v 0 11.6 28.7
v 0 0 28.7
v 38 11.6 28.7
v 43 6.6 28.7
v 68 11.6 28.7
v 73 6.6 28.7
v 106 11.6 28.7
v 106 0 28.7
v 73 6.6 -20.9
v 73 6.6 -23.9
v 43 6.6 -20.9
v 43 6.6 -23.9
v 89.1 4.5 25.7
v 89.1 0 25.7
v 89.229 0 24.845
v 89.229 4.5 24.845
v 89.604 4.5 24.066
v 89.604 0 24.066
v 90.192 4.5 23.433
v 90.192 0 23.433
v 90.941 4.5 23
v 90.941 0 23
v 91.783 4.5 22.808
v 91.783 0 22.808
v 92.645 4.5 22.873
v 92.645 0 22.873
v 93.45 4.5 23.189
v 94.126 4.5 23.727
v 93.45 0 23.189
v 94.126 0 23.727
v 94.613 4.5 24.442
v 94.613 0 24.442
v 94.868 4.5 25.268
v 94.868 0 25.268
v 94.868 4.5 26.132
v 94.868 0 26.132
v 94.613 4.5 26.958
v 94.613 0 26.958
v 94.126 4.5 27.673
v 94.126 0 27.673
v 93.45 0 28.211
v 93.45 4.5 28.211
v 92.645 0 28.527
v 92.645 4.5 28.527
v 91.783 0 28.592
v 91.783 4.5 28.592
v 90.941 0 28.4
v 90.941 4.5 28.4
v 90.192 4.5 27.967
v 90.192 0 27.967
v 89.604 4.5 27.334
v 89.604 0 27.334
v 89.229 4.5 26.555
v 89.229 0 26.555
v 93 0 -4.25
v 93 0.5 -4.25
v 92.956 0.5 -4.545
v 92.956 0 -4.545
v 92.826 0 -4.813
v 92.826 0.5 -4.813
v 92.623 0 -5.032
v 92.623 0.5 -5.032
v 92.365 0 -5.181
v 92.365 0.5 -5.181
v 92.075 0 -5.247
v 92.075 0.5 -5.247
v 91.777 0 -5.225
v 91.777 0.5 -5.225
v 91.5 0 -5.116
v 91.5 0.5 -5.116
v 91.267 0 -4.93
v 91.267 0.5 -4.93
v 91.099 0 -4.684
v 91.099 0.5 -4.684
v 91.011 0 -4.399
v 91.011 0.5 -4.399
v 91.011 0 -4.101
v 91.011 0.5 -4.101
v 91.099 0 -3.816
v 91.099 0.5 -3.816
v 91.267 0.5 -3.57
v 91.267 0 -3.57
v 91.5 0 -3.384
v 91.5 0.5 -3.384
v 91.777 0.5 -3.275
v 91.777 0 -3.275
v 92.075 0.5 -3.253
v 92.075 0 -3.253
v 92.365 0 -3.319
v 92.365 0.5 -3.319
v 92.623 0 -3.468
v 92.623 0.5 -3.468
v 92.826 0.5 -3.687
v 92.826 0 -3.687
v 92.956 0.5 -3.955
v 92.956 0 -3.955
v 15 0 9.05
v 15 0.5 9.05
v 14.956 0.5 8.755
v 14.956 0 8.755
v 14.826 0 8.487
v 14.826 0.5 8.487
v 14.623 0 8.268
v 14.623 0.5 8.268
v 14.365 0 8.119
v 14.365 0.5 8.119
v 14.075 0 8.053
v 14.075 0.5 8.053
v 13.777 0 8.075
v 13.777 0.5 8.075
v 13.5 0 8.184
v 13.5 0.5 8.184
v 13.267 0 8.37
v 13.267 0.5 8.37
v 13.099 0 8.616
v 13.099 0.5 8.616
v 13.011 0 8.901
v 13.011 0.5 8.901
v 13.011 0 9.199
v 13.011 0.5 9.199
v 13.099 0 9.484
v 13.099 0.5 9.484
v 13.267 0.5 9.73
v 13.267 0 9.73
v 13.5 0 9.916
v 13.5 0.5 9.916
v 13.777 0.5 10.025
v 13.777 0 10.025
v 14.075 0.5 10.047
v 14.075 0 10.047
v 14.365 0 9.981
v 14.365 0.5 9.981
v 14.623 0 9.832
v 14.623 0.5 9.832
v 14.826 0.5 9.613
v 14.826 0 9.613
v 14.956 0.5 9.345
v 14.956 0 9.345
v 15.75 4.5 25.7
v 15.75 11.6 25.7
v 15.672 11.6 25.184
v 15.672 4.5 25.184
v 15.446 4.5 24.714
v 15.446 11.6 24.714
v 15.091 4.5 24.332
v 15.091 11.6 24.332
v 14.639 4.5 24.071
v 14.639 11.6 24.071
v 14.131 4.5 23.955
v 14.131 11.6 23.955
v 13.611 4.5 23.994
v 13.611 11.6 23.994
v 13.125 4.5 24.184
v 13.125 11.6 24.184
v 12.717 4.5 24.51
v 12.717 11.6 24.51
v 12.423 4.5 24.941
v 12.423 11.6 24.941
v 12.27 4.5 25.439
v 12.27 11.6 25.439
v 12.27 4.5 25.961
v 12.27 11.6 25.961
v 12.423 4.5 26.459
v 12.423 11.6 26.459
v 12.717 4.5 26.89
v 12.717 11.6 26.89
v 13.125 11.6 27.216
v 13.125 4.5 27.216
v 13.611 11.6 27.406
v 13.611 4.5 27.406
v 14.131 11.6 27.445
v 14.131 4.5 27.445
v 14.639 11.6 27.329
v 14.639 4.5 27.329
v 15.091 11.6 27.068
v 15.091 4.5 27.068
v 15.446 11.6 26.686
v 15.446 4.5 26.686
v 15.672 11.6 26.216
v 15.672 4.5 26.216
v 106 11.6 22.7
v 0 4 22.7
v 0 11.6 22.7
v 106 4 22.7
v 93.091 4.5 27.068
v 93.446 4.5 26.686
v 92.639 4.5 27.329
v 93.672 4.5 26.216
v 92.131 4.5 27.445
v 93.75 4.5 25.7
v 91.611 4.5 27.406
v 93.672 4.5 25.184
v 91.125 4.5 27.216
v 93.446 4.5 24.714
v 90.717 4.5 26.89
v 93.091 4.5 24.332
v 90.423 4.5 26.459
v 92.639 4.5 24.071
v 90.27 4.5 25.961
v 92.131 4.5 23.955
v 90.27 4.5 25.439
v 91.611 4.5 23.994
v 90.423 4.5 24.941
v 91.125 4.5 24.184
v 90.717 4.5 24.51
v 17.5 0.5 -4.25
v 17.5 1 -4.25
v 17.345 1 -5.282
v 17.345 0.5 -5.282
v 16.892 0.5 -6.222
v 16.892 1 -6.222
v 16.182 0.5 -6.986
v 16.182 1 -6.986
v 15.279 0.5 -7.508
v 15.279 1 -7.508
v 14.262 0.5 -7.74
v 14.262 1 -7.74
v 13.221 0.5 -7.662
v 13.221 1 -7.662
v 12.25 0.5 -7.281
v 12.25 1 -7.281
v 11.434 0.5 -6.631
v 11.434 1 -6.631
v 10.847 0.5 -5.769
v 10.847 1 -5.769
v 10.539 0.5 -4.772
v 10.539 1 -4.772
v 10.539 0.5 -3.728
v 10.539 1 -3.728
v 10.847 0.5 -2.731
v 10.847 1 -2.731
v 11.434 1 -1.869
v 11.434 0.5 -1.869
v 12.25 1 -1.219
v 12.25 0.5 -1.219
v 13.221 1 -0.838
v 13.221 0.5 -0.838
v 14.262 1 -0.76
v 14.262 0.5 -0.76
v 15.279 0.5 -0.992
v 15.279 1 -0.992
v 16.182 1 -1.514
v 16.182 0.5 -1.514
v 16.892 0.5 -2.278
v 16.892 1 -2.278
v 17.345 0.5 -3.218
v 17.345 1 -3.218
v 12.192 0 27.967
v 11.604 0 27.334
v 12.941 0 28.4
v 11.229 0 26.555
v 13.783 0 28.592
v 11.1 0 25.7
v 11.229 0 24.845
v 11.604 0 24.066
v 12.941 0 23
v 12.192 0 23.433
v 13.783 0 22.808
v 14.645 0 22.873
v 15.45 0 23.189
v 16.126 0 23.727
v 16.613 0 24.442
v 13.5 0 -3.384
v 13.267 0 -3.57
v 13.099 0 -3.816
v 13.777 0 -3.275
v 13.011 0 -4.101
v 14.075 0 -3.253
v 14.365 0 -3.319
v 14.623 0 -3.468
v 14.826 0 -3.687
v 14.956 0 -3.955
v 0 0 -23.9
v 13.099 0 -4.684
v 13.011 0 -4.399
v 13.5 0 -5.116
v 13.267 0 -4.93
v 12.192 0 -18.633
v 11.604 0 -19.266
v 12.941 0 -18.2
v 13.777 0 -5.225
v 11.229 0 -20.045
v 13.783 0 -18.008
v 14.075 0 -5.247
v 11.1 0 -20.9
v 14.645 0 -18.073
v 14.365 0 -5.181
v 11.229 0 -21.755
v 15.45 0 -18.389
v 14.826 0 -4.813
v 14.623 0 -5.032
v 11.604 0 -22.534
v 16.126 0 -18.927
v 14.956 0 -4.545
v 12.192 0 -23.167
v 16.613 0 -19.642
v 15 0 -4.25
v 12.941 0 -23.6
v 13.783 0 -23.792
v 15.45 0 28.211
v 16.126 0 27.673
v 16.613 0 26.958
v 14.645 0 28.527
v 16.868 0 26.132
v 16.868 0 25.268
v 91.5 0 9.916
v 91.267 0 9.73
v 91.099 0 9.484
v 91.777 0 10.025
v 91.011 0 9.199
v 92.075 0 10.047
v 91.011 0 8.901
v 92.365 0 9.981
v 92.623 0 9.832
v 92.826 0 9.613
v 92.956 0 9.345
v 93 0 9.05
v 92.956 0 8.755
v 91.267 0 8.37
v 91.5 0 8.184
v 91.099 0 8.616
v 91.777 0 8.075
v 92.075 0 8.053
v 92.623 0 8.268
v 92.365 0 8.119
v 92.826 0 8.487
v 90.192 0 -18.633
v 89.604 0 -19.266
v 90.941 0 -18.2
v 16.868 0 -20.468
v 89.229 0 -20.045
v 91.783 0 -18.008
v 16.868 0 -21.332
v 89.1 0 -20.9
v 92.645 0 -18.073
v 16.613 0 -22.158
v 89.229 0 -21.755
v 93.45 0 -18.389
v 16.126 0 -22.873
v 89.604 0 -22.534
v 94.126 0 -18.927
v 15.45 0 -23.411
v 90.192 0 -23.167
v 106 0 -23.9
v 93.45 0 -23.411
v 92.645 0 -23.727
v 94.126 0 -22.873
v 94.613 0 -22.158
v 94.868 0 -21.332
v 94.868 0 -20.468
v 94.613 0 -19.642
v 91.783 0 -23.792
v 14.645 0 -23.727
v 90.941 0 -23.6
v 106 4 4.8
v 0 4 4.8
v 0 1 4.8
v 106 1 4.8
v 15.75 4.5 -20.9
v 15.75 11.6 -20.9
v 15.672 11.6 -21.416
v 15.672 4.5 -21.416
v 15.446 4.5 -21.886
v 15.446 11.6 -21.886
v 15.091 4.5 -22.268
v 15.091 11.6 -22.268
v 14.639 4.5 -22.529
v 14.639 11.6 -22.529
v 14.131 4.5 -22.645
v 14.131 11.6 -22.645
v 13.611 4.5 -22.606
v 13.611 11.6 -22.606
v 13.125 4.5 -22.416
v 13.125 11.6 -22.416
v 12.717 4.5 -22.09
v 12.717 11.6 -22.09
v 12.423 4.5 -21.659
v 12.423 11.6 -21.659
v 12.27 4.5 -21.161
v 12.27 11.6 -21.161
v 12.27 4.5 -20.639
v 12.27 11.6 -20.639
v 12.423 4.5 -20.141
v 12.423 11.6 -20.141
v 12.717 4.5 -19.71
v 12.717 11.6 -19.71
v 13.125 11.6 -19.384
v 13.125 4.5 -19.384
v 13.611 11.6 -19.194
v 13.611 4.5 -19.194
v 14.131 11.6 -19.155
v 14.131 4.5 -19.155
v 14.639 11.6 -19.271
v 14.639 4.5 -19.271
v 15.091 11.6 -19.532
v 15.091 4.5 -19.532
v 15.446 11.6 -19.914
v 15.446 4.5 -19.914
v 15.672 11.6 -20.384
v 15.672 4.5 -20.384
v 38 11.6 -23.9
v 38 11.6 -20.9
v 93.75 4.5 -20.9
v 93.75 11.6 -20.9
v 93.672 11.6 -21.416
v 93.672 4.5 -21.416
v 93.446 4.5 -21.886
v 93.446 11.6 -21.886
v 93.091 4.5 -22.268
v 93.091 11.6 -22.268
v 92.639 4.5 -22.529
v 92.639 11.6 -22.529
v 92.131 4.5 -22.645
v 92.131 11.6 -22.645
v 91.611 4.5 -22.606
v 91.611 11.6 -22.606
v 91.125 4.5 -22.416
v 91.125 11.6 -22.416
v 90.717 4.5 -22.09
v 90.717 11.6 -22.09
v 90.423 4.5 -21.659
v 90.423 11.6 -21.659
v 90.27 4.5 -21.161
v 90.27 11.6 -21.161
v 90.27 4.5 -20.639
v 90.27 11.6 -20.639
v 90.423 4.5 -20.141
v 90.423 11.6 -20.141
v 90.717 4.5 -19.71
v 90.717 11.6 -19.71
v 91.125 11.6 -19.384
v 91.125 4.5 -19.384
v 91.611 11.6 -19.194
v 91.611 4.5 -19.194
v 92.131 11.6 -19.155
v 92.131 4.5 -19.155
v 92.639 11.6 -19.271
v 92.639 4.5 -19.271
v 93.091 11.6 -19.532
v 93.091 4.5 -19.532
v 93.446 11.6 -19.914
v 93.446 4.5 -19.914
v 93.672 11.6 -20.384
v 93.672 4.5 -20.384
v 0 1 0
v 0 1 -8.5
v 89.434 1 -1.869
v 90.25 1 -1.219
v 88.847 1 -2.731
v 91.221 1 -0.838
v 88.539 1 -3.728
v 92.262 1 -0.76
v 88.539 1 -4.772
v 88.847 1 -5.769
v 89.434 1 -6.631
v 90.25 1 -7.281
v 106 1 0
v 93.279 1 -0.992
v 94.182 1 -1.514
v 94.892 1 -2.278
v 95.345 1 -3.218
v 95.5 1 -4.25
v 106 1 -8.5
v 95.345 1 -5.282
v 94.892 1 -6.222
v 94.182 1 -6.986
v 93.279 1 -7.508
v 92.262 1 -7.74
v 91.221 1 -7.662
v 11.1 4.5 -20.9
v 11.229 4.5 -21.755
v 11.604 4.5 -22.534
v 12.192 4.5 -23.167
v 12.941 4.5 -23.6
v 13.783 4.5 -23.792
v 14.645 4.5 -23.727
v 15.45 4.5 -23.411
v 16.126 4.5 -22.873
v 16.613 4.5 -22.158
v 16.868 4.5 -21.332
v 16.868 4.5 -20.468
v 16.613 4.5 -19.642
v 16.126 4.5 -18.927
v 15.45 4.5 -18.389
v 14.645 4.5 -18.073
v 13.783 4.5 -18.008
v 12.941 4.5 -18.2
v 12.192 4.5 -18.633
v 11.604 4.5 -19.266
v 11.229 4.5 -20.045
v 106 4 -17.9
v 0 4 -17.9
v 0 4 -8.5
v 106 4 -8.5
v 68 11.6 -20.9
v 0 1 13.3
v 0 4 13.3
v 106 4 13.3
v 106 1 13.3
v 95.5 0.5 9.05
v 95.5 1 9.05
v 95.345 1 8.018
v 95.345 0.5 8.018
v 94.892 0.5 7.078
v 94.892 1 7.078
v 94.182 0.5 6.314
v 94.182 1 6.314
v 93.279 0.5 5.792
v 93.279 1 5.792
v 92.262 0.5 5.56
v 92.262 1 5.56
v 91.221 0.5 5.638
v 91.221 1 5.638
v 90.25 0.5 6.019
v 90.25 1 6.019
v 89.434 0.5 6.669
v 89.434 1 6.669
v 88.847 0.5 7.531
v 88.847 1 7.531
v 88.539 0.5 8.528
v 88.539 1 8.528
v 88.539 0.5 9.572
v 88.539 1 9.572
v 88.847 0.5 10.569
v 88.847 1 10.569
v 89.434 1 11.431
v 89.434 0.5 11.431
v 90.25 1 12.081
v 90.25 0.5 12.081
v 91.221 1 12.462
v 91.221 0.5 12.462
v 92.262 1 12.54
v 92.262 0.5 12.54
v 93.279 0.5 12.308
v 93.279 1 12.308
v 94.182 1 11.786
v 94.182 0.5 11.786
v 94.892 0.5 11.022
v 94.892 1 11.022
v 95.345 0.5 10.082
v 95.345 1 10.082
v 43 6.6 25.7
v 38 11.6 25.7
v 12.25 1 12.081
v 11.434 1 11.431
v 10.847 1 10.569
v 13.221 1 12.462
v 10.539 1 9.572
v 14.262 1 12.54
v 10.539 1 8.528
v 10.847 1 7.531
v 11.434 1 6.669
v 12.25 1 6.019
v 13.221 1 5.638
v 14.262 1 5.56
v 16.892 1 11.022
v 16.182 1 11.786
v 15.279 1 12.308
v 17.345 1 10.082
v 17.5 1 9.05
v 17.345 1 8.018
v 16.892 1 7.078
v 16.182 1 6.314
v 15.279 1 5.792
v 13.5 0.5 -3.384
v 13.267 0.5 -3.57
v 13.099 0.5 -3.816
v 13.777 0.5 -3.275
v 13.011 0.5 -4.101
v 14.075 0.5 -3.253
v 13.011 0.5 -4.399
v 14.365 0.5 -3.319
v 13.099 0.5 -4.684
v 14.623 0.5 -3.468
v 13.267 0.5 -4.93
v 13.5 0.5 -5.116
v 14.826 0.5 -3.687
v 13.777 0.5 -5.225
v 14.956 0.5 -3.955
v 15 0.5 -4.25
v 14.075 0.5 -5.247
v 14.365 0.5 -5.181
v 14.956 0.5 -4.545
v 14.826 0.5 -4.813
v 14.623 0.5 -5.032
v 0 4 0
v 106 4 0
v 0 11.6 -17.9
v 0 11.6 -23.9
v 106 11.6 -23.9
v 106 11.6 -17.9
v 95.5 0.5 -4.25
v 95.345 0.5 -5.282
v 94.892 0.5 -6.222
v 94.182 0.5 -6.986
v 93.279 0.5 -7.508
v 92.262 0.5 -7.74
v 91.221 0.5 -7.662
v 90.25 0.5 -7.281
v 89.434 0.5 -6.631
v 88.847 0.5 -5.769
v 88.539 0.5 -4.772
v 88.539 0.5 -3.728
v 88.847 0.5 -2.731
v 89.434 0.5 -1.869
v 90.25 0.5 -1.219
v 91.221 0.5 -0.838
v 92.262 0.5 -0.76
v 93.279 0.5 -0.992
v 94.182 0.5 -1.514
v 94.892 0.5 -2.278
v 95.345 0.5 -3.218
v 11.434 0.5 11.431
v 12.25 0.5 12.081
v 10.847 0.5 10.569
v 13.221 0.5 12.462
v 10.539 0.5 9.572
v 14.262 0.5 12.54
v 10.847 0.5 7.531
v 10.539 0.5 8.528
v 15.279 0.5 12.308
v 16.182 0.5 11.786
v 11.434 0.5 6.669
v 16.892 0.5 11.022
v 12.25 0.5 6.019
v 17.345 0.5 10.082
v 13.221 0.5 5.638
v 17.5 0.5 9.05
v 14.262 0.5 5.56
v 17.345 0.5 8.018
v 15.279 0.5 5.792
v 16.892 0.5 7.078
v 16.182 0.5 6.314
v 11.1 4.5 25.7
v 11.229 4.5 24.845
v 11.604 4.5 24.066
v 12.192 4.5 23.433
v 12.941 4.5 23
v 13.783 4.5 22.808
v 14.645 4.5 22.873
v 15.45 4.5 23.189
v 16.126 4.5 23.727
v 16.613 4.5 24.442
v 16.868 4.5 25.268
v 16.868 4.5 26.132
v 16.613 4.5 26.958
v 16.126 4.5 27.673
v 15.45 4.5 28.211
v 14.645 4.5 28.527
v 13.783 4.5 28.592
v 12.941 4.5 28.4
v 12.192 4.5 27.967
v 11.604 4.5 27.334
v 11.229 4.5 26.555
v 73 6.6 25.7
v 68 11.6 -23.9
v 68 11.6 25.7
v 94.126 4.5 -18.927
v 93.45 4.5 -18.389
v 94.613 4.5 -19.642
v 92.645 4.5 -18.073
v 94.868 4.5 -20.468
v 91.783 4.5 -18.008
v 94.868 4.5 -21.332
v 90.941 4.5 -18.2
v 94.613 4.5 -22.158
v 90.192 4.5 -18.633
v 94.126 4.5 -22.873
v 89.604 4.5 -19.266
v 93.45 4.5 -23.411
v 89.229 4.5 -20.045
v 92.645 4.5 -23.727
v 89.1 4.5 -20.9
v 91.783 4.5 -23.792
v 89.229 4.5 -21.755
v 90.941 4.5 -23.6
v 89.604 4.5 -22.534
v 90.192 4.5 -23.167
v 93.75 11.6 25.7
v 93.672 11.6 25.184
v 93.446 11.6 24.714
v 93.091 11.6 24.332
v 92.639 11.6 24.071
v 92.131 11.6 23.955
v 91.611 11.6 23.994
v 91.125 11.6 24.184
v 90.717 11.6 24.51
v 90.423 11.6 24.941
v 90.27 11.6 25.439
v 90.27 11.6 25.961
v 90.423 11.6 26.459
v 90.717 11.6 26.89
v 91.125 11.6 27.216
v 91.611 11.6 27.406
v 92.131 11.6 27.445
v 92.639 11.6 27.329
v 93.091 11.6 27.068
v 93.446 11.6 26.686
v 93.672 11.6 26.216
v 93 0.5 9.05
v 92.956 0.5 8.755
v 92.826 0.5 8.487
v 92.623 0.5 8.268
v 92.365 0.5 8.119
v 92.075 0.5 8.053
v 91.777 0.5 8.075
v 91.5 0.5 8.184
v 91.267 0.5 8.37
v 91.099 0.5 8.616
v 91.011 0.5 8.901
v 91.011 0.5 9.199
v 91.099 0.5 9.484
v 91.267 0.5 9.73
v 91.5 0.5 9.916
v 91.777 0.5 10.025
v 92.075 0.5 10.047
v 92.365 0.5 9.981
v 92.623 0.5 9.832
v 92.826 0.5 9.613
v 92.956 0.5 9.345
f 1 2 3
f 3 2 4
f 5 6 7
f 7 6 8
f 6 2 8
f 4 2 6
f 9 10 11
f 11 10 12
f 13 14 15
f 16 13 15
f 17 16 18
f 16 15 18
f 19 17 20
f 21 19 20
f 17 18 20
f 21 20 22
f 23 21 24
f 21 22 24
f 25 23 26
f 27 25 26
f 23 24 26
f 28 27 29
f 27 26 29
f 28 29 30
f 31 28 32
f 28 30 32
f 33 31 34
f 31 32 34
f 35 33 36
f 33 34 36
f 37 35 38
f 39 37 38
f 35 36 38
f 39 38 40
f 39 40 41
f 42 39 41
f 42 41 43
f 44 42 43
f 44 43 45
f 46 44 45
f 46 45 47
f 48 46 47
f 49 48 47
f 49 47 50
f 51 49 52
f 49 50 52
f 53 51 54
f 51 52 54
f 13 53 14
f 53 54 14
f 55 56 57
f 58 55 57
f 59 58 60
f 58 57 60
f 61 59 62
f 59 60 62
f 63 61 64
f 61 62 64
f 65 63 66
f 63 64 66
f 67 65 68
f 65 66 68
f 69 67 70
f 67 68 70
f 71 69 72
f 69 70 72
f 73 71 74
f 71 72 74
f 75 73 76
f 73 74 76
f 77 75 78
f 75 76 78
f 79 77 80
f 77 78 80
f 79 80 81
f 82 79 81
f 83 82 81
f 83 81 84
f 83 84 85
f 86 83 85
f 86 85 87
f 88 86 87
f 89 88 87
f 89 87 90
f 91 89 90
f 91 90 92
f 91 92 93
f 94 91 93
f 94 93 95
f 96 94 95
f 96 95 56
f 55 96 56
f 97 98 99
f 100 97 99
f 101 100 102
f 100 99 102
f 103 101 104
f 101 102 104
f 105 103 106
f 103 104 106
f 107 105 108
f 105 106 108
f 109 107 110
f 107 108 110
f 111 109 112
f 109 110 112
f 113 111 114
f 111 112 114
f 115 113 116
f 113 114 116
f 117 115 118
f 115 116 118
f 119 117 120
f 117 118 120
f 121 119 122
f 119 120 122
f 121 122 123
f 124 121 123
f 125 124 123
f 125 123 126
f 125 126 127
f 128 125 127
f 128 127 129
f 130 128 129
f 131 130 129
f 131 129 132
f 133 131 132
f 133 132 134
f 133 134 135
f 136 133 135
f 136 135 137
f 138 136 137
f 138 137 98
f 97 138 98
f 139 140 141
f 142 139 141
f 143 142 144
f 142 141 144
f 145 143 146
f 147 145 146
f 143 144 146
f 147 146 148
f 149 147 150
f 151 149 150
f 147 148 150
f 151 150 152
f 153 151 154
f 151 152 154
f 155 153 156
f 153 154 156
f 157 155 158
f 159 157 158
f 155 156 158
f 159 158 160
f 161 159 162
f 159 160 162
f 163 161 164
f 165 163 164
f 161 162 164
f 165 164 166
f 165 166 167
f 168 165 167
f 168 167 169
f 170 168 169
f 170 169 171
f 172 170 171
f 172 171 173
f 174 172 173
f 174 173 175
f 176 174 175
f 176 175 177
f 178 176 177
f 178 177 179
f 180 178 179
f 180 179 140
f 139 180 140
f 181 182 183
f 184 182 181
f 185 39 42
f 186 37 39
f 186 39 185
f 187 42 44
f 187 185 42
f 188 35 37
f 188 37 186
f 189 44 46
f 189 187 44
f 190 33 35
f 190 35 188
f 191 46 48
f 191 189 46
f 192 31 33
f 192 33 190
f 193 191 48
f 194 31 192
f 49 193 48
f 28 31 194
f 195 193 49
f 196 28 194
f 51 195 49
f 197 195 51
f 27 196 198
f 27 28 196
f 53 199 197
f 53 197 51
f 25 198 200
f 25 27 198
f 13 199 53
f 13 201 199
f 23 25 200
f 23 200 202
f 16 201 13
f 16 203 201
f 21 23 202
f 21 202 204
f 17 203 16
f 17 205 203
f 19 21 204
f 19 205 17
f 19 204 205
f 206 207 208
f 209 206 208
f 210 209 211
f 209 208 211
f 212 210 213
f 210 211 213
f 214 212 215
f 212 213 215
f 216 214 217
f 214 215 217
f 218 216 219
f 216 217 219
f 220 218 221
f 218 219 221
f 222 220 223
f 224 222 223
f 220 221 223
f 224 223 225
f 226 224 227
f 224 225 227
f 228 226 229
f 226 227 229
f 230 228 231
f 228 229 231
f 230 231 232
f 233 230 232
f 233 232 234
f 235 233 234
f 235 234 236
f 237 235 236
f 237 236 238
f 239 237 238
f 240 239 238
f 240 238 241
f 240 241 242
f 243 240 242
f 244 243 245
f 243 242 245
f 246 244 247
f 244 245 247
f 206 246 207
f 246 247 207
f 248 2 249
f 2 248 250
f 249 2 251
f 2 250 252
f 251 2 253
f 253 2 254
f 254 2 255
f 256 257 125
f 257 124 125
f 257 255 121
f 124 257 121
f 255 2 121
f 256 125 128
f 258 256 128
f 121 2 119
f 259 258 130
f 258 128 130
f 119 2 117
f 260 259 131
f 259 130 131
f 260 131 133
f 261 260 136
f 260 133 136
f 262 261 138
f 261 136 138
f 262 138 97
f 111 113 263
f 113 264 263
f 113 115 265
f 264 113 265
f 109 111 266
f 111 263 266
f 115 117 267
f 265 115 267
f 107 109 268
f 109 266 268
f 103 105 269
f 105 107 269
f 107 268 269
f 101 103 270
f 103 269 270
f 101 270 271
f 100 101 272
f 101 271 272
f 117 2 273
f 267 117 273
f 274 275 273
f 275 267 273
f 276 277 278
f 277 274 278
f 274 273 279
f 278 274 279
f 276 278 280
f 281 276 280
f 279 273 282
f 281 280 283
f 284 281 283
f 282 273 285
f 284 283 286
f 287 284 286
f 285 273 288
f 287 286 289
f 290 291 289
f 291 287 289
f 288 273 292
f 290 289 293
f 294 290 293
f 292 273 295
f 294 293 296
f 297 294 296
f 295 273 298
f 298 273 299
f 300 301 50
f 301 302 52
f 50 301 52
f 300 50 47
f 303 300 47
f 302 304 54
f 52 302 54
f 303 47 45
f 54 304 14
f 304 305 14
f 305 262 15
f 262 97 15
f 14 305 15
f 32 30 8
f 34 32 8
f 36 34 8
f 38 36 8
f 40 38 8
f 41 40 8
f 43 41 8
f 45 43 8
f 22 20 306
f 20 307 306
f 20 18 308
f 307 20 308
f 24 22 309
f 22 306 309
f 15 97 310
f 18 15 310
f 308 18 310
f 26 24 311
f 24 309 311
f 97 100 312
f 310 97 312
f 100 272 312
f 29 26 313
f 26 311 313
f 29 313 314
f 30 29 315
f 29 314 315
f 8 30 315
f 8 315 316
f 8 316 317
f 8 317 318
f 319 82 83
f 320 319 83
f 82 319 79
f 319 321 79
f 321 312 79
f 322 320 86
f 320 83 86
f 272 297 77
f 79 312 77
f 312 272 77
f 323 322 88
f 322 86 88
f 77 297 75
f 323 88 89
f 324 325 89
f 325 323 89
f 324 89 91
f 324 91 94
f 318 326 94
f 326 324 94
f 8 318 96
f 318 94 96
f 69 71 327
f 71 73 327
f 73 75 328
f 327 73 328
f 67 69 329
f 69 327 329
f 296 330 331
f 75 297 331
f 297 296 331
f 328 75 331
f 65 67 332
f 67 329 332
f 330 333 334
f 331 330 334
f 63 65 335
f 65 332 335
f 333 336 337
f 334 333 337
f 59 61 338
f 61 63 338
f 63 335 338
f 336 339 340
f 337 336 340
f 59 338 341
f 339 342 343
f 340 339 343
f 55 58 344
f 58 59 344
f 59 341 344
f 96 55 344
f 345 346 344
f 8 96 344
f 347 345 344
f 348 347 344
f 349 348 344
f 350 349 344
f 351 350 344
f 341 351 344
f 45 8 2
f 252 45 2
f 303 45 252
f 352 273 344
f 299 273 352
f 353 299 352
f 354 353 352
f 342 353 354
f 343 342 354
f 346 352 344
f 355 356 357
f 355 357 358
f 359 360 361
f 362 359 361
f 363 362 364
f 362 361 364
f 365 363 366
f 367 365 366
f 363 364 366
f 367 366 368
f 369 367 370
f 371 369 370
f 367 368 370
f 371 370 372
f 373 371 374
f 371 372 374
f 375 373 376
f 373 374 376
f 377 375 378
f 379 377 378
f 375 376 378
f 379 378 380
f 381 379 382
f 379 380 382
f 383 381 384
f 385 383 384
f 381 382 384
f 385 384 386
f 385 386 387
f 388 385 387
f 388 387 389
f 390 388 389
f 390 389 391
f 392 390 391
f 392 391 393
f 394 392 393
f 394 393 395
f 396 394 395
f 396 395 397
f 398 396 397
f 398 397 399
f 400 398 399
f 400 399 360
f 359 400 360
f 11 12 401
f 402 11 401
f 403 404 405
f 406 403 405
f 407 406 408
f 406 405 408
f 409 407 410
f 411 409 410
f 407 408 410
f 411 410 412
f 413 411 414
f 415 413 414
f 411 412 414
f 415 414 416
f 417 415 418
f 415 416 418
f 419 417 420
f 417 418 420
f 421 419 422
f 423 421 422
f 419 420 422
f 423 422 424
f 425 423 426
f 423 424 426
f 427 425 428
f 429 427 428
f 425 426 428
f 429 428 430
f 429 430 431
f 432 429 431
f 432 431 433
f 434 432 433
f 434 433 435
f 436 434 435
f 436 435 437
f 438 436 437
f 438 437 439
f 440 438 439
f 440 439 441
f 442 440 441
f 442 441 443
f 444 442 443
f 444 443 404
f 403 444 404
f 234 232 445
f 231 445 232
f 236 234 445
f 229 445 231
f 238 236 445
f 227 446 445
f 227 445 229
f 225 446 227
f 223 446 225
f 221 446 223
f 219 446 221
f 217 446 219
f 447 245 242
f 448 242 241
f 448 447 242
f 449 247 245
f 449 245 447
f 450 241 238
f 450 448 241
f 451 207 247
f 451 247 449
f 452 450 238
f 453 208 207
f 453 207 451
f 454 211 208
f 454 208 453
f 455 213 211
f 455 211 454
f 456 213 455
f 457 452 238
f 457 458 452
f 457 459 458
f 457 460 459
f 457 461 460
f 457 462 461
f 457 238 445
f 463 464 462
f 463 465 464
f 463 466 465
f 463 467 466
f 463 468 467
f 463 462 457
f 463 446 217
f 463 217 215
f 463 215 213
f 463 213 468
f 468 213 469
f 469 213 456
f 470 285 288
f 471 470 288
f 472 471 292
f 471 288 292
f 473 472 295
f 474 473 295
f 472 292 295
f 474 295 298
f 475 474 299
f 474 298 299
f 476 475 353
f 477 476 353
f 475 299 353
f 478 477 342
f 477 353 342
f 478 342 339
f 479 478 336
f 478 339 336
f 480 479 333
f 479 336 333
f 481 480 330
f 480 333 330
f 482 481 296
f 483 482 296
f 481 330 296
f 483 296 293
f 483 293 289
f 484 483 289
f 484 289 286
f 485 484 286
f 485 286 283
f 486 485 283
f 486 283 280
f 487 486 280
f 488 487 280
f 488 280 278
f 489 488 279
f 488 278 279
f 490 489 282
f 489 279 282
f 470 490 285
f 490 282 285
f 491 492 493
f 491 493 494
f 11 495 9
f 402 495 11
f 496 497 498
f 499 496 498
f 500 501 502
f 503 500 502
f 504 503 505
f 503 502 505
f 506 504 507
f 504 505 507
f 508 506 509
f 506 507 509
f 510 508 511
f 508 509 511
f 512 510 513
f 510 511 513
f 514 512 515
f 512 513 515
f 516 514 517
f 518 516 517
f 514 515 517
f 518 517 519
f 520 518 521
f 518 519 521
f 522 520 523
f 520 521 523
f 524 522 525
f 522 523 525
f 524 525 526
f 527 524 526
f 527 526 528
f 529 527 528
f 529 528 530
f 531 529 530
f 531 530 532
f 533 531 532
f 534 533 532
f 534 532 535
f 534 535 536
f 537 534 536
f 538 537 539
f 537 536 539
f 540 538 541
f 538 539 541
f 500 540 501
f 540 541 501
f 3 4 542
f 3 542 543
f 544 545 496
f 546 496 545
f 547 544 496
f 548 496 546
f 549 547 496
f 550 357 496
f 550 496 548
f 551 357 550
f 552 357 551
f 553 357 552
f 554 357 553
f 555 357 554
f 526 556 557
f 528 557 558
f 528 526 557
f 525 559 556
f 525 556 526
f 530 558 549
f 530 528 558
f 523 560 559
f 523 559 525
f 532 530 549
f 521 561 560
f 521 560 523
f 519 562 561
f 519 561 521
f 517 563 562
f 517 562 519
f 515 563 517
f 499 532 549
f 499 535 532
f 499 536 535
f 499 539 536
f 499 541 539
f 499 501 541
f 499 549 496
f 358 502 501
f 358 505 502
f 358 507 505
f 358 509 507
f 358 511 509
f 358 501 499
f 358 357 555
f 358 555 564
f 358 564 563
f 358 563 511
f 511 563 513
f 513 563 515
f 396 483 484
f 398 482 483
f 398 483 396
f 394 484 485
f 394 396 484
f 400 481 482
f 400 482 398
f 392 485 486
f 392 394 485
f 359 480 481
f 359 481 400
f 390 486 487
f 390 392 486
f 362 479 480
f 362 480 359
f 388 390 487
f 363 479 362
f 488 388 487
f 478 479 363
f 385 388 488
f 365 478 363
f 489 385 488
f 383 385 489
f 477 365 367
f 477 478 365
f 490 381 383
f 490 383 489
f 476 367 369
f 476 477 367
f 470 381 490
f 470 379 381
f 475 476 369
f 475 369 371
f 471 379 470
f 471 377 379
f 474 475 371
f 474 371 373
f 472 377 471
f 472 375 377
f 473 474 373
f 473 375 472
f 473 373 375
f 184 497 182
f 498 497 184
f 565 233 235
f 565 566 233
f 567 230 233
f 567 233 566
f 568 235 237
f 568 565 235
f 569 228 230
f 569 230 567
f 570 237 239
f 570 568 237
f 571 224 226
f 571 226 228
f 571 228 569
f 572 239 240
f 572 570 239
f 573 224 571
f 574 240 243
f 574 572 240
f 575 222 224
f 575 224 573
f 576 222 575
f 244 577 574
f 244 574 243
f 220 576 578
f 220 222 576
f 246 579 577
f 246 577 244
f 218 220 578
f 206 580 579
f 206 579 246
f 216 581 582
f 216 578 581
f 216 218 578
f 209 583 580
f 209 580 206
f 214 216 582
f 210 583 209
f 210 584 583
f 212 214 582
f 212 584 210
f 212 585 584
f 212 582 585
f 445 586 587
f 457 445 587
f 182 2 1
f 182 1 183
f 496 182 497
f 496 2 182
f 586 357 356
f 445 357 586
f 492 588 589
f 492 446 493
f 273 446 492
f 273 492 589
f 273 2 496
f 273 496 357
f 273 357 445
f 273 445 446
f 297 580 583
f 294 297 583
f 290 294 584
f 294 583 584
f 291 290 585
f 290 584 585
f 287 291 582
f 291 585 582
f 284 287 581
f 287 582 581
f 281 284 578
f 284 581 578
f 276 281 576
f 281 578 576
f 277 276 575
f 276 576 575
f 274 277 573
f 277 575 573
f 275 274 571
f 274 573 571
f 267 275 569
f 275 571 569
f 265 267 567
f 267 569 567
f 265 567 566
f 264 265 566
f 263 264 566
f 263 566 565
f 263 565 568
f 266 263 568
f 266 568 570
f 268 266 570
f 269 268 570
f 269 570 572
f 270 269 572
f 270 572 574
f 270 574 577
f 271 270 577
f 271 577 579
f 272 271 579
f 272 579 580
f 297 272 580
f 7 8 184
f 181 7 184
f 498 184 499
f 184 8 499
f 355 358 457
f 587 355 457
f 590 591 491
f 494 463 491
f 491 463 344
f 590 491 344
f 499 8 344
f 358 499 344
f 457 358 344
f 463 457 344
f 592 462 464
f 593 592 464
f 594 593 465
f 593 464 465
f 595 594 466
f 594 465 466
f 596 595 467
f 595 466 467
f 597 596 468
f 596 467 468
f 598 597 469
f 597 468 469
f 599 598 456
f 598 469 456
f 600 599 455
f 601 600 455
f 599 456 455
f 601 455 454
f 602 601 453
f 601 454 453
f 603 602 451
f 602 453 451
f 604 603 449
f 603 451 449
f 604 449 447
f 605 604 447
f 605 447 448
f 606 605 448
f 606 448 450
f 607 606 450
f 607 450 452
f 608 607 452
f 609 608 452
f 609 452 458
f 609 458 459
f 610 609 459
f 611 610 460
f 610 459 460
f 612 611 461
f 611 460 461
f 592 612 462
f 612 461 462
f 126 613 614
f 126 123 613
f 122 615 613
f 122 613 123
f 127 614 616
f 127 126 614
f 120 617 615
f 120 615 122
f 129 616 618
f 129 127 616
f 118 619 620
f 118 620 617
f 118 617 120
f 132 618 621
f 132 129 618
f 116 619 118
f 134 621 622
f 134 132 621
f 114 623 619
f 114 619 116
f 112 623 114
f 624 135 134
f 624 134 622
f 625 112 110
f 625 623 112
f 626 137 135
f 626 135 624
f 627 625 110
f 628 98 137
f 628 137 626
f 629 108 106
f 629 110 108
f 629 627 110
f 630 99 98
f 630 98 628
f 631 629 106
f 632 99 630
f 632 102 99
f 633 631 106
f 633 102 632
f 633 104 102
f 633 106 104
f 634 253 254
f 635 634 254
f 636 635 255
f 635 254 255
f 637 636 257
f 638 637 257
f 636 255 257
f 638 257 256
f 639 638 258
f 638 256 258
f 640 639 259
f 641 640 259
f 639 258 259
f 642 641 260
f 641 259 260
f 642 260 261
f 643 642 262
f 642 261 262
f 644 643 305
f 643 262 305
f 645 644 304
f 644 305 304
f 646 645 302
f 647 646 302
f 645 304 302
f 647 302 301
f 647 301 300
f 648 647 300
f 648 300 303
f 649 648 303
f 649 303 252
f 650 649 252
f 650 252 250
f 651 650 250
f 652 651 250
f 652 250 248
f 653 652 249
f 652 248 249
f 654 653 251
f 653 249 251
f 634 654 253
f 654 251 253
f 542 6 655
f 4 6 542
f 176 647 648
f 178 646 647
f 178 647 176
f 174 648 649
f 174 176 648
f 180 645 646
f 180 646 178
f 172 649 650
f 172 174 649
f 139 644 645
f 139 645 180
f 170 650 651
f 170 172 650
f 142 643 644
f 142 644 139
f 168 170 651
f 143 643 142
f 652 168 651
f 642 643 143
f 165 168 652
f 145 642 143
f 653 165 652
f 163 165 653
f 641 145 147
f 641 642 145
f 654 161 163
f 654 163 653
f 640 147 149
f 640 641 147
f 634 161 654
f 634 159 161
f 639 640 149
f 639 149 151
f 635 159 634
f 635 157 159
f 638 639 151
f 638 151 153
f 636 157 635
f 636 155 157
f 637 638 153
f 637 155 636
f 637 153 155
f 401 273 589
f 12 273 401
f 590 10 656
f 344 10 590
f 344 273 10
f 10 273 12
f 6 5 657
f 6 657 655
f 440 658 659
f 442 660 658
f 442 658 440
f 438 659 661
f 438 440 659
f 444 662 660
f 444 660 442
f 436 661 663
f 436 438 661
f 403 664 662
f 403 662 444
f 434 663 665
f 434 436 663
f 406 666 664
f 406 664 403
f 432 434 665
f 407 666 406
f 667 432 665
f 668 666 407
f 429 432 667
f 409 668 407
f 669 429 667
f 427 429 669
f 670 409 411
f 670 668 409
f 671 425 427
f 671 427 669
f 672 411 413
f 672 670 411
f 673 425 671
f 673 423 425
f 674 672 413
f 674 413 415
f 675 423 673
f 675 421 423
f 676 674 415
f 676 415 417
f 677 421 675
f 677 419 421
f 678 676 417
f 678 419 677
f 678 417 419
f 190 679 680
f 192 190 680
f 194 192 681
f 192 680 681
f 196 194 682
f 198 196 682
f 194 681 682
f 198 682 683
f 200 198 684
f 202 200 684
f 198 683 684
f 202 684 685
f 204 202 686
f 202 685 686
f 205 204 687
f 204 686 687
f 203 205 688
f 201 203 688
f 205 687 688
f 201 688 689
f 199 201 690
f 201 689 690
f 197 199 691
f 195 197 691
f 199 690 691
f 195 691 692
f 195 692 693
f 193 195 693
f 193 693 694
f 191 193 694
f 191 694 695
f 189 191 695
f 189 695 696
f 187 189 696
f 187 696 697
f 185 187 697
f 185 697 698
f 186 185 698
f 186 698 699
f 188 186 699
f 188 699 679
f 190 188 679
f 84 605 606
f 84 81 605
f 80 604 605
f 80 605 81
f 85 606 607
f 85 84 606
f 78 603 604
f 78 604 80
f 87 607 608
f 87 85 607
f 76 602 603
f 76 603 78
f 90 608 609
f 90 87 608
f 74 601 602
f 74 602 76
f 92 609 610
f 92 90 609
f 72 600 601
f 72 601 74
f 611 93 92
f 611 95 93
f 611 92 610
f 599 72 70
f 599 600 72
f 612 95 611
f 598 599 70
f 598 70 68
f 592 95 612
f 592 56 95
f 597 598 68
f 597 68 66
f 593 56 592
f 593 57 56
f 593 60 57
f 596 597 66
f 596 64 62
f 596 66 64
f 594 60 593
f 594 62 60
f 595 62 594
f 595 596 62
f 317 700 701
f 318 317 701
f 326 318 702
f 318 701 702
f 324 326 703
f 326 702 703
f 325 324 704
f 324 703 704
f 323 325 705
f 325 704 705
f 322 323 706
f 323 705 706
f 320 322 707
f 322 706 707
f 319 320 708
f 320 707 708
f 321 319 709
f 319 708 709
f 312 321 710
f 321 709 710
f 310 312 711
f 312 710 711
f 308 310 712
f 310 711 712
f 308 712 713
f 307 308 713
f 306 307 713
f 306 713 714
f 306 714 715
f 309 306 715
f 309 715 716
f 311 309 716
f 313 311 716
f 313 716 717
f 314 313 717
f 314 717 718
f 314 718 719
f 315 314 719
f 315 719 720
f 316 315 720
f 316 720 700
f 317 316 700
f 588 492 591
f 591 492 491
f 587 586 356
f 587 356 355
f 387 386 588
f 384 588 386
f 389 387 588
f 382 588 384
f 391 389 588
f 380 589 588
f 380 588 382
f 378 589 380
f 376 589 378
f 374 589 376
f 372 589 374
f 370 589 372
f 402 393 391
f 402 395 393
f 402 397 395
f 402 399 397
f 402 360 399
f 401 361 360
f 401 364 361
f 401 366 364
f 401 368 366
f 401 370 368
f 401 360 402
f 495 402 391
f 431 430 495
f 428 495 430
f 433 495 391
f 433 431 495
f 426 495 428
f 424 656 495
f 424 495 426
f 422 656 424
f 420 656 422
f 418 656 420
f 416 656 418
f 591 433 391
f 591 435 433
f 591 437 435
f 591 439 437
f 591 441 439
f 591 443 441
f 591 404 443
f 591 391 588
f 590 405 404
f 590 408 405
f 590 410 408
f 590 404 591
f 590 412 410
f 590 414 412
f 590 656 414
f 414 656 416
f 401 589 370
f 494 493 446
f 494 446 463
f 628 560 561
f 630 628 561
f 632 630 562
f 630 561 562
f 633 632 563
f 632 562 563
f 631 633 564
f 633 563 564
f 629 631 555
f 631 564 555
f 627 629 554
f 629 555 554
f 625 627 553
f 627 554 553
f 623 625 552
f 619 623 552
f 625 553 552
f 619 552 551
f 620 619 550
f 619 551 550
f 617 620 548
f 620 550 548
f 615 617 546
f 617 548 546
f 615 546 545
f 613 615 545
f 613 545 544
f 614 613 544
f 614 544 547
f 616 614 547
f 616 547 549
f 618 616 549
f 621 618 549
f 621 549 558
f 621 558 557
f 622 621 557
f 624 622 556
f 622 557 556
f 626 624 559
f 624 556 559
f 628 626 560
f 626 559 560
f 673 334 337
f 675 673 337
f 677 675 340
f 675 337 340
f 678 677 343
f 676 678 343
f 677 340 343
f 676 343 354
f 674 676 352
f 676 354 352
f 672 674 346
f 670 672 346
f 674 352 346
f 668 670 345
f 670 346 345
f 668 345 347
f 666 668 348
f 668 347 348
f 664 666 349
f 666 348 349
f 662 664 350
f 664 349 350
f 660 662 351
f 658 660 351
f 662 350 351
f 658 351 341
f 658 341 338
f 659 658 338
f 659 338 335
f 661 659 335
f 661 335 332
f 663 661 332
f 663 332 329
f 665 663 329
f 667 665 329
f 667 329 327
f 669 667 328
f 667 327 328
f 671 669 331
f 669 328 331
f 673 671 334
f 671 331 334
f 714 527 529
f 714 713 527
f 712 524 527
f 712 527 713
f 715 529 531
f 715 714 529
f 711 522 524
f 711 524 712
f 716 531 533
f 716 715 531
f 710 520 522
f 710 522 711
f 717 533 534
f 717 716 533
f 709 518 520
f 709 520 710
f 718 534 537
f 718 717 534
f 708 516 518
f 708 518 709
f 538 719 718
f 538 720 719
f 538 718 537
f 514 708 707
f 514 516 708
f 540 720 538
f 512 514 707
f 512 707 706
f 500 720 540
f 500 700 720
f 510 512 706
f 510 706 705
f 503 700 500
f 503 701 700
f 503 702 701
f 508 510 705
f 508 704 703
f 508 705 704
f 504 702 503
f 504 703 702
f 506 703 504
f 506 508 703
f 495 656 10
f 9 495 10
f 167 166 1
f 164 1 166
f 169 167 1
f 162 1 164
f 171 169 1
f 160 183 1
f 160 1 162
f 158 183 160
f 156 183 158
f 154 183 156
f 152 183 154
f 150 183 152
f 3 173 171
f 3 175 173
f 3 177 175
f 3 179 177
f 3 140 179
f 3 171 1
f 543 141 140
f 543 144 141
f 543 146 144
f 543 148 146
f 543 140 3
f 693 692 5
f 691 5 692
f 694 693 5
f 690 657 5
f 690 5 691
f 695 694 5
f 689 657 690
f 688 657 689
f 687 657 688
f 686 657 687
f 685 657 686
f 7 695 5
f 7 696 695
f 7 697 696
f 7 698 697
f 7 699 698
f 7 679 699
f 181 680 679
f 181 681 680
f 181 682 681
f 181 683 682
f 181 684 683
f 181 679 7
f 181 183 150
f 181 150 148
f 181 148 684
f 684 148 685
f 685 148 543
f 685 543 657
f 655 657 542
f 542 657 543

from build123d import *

# Parameters (mm, degrees)
SKETCH1_W           = 106
SKETCH1_H           = 6
SKETCH1_H_2         = 9.4
SKETCH1_H_3         = 8.5
SKETCH1_H_4         = 4.8
BOSS_EXTRUDE4_DEPTH = 4
SKETCH4_W           = 106
SKETCH4_H           = 8.5
CUT_EXTRUDE2_DEPTH  = 3
SKETCH5_W           = 106
SKETCH5_H           = 6
BOSS_EXTRUDE5_DEPTH = 7.6
SKETCH6_R           = 3.5
CUT_EXTRUDE3_DEPTH  = 0.5
SKETCH8_R           = 1
CUT_EXTRUDE4_DEPTH  = 20
SKETCH7_R           = 1
CUT_EXTRUDE5_DEPTH  = 20
SKETCH9_R           = 1
CUT_EXTRUDE6_DEPTH  = 20
SKETCH10_R          = 1.75
CUT_EXTRUDE7_DEPTH  = 20
SKETCH11_R          = 2.9
CUT_EXTRUDE8_DEPTH  = 4.5
CUT_EXTRUDE9_DEPTH  = 3
CUT_EXTRUDE10_DEPTH = 3


with BuildPart() as part:
    # Sketch1 → Boss-Extrude4 (new body)
    with BuildSketch(Plane(origin=(0, 0, 0), x_dir=(1, 0, 0), z_dir=(0, 1, 0))):
        with Locations((53, 20.9)):
            Rectangle(SKETCH1_W, SKETCH1_H)
        with Locations((53, 13.2)):
            Rectangle(SKETCH1_W, SKETCH1_H_2)
        with Locations((53, 4.25)):
            Rectangle(SKETCH1_W, SKETCH1_H_3)
        with Locations((53, -2.4)):
            Rectangle(SKETCH1_W, SKETCH1_H_4)
        with Locations((53, -9.05)):
            Rectangle(SKETCH1_W, SKETCH1_H_3)
        with Locations((53, -18)):
            Rectangle(SKETCH1_W, SKETCH1_H_2)
        with Locations((53, -25.7)):
            Rectangle(SKETCH1_W, SKETCH1_H)
    extrude(amount=BOSS_EXTRUDE4_DEPTH)

    # Sketch4 → Cut-Extrude2 (cut)
    with BuildSketch(Plane(origin=(0, 4, 0), x_dir=(1, 0, 0), z_dir=(0, 1, 0))):
        with Locations((53, 4.25)):
            Rectangle(SKETCH4_W, SKETCH4_H)
        with Locations((53, -9.05)):
            Rectangle(SKETCH4_W, SKETCH4_H)
    extrude(amount=-CUT_EXTRUDE2_DEPTH, mode=Mode.SUBTRACT)

    # Sketch5 → Boss-Extrude5 (add)
    with BuildSketch(Plane(origin=(0, 4, 0), x_dir=(1, 0, 0), z_dir=(0, 1, 0))):
        with Locations((53, 20.9)):
            Rectangle(SKETCH5_W, SKETCH5_H)
        with Locations((53, -25.7)):
            Rectangle(SKETCH5_W, SKETCH5_H)
    extrude(amount=BOSS_EXTRUDE5_DEPTH)

    # Sketch6 → Cut-Extrude3 (cut)
    with BuildSketch(Plane(origin=(0, 1, 0), x_dir=(1, 0, 0), z_dir=(0, 1, 0))):
        with Locations((92, -9.05)):
            Circle(SKETCH6_R)
        with Locations((14, -9.05)):
            Circle(SKETCH6_R)
        with Locations((92, 4.25)):
            Circle(SKETCH6_R)
        with Locations((14, 4.25)):
            Circle(SKETCH6_R)
    extrude(amount=-CUT_EXTRUDE3_DEPTH, mode=Mode.SUBTRACT)

    # Sketch8 → Cut-Extrude4 (cut)
    with BuildSketch(Plane(origin=(0, 0.5, 0), x_dir=(1, 0, 0), z_dir=(0, 1, 0))):
        with Locations((14, 4.25)):
            Circle(SKETCH8_R)
        with Locations((14, -9.05)):
            Circle(SKETCH8_R)
    extrude(amount=-CUT_EXTRUDE4_DEPTH, mode=Mode.SUBTRACT)

    # Sketch7 → Cut-Extrude5 (cut)
    with BuildSketch(Plane(origin=(0, 0.5, 0), x_dir=(1, 0, 0), z_dir=(0, 1, 0))):
        with Locations((92, 4.25)):
            Circle(SKETCH7_R)
    extrude(amount=-CUT_EXTRUDE5_DEPTH, mode=Mode.SUBTRACT)

    # Sketch9 → Cut-Extrude6 (cut)
    with BuildSketch(Plane(origin=(0, 0.5, 0), x_dir=(1, 0, 0), z_dir=(0, 1, 0))):
        with Locations((92, -9.05)):
            Circle(SKETCH9_R)
    extrude(amount=-CUT_EXTRUDE6_DEPTH, mode=Mode.SUBTRACT)

    # Sketch10 → Cut-Extrude7 (cut)
    with BuildSketch(Plane(origin=(0, 11.6, 0), x_dir=(1, 0, 0), z_dir=(0, 1, 0))):
        with Locations((92, 20.9)):
            Circle(SKETCH10_R)
        with Locations((14, 20.9)):
            Circle(SKETCH10_R)
        with Locations((92, -25.7)):
            Circle(SKETCH10_R)
        with Locations((14, -25.7)):
            Circle(SKETCH10_R)
    extrude(amount=-CUT_EXTRUDE7_DEPTH, mode=Mode.SUBTRACT)

    # Sketch11 → Cut-Extrude8 (cut)
    with BuildSketch(Plane(origin=(0, 0, 0), x_dir=(-1, 0, 0), z_dir=(0, -1, 0))):
        with Locations((-92, 20.9)):
            Circle(SKETCH11_R)
        with Locations((-92, -25.7)):
            Circle(SKETCH11_R)
        with Locations((-14, -25.7)):
            Circle(SKETCH11_R)
        with Locations((-14, 20.9)):
            Circle(SKETCH11_R)
    extrude(amount=-CUT_EXTRUDE8_DEPTH, mode=Mode.SUBTRACT)

    # Sketch12 → Cut-Extrude9 (cut)
    with BuildSketch(Plane(origin=(0, 0, -23.9), x_dir=(-1, 0, 0), z_dir=(0, 0, -1))):
        Polygon((-68, 11.6), (-73, 6.6), (-43, 6.6), (-38, 11.6), align=None)
    extrude(amount=-CUT_EXTRUDE9_DEPTH, mode=Mode.SUBTRACT)

    # Sketch13 → Cut-Extrude10 (cut)
    with BuildSketch(Plane.XY.offset(28.7)):
        Polygon((68, 11.6), (73, 6.6), (43, 6.6), (38, 11.6), align=None)
    extrude(amount=-CUT_EXTRUDE10_DEPTH, mode=Mode.SUBTRACT)


solid = part.part
